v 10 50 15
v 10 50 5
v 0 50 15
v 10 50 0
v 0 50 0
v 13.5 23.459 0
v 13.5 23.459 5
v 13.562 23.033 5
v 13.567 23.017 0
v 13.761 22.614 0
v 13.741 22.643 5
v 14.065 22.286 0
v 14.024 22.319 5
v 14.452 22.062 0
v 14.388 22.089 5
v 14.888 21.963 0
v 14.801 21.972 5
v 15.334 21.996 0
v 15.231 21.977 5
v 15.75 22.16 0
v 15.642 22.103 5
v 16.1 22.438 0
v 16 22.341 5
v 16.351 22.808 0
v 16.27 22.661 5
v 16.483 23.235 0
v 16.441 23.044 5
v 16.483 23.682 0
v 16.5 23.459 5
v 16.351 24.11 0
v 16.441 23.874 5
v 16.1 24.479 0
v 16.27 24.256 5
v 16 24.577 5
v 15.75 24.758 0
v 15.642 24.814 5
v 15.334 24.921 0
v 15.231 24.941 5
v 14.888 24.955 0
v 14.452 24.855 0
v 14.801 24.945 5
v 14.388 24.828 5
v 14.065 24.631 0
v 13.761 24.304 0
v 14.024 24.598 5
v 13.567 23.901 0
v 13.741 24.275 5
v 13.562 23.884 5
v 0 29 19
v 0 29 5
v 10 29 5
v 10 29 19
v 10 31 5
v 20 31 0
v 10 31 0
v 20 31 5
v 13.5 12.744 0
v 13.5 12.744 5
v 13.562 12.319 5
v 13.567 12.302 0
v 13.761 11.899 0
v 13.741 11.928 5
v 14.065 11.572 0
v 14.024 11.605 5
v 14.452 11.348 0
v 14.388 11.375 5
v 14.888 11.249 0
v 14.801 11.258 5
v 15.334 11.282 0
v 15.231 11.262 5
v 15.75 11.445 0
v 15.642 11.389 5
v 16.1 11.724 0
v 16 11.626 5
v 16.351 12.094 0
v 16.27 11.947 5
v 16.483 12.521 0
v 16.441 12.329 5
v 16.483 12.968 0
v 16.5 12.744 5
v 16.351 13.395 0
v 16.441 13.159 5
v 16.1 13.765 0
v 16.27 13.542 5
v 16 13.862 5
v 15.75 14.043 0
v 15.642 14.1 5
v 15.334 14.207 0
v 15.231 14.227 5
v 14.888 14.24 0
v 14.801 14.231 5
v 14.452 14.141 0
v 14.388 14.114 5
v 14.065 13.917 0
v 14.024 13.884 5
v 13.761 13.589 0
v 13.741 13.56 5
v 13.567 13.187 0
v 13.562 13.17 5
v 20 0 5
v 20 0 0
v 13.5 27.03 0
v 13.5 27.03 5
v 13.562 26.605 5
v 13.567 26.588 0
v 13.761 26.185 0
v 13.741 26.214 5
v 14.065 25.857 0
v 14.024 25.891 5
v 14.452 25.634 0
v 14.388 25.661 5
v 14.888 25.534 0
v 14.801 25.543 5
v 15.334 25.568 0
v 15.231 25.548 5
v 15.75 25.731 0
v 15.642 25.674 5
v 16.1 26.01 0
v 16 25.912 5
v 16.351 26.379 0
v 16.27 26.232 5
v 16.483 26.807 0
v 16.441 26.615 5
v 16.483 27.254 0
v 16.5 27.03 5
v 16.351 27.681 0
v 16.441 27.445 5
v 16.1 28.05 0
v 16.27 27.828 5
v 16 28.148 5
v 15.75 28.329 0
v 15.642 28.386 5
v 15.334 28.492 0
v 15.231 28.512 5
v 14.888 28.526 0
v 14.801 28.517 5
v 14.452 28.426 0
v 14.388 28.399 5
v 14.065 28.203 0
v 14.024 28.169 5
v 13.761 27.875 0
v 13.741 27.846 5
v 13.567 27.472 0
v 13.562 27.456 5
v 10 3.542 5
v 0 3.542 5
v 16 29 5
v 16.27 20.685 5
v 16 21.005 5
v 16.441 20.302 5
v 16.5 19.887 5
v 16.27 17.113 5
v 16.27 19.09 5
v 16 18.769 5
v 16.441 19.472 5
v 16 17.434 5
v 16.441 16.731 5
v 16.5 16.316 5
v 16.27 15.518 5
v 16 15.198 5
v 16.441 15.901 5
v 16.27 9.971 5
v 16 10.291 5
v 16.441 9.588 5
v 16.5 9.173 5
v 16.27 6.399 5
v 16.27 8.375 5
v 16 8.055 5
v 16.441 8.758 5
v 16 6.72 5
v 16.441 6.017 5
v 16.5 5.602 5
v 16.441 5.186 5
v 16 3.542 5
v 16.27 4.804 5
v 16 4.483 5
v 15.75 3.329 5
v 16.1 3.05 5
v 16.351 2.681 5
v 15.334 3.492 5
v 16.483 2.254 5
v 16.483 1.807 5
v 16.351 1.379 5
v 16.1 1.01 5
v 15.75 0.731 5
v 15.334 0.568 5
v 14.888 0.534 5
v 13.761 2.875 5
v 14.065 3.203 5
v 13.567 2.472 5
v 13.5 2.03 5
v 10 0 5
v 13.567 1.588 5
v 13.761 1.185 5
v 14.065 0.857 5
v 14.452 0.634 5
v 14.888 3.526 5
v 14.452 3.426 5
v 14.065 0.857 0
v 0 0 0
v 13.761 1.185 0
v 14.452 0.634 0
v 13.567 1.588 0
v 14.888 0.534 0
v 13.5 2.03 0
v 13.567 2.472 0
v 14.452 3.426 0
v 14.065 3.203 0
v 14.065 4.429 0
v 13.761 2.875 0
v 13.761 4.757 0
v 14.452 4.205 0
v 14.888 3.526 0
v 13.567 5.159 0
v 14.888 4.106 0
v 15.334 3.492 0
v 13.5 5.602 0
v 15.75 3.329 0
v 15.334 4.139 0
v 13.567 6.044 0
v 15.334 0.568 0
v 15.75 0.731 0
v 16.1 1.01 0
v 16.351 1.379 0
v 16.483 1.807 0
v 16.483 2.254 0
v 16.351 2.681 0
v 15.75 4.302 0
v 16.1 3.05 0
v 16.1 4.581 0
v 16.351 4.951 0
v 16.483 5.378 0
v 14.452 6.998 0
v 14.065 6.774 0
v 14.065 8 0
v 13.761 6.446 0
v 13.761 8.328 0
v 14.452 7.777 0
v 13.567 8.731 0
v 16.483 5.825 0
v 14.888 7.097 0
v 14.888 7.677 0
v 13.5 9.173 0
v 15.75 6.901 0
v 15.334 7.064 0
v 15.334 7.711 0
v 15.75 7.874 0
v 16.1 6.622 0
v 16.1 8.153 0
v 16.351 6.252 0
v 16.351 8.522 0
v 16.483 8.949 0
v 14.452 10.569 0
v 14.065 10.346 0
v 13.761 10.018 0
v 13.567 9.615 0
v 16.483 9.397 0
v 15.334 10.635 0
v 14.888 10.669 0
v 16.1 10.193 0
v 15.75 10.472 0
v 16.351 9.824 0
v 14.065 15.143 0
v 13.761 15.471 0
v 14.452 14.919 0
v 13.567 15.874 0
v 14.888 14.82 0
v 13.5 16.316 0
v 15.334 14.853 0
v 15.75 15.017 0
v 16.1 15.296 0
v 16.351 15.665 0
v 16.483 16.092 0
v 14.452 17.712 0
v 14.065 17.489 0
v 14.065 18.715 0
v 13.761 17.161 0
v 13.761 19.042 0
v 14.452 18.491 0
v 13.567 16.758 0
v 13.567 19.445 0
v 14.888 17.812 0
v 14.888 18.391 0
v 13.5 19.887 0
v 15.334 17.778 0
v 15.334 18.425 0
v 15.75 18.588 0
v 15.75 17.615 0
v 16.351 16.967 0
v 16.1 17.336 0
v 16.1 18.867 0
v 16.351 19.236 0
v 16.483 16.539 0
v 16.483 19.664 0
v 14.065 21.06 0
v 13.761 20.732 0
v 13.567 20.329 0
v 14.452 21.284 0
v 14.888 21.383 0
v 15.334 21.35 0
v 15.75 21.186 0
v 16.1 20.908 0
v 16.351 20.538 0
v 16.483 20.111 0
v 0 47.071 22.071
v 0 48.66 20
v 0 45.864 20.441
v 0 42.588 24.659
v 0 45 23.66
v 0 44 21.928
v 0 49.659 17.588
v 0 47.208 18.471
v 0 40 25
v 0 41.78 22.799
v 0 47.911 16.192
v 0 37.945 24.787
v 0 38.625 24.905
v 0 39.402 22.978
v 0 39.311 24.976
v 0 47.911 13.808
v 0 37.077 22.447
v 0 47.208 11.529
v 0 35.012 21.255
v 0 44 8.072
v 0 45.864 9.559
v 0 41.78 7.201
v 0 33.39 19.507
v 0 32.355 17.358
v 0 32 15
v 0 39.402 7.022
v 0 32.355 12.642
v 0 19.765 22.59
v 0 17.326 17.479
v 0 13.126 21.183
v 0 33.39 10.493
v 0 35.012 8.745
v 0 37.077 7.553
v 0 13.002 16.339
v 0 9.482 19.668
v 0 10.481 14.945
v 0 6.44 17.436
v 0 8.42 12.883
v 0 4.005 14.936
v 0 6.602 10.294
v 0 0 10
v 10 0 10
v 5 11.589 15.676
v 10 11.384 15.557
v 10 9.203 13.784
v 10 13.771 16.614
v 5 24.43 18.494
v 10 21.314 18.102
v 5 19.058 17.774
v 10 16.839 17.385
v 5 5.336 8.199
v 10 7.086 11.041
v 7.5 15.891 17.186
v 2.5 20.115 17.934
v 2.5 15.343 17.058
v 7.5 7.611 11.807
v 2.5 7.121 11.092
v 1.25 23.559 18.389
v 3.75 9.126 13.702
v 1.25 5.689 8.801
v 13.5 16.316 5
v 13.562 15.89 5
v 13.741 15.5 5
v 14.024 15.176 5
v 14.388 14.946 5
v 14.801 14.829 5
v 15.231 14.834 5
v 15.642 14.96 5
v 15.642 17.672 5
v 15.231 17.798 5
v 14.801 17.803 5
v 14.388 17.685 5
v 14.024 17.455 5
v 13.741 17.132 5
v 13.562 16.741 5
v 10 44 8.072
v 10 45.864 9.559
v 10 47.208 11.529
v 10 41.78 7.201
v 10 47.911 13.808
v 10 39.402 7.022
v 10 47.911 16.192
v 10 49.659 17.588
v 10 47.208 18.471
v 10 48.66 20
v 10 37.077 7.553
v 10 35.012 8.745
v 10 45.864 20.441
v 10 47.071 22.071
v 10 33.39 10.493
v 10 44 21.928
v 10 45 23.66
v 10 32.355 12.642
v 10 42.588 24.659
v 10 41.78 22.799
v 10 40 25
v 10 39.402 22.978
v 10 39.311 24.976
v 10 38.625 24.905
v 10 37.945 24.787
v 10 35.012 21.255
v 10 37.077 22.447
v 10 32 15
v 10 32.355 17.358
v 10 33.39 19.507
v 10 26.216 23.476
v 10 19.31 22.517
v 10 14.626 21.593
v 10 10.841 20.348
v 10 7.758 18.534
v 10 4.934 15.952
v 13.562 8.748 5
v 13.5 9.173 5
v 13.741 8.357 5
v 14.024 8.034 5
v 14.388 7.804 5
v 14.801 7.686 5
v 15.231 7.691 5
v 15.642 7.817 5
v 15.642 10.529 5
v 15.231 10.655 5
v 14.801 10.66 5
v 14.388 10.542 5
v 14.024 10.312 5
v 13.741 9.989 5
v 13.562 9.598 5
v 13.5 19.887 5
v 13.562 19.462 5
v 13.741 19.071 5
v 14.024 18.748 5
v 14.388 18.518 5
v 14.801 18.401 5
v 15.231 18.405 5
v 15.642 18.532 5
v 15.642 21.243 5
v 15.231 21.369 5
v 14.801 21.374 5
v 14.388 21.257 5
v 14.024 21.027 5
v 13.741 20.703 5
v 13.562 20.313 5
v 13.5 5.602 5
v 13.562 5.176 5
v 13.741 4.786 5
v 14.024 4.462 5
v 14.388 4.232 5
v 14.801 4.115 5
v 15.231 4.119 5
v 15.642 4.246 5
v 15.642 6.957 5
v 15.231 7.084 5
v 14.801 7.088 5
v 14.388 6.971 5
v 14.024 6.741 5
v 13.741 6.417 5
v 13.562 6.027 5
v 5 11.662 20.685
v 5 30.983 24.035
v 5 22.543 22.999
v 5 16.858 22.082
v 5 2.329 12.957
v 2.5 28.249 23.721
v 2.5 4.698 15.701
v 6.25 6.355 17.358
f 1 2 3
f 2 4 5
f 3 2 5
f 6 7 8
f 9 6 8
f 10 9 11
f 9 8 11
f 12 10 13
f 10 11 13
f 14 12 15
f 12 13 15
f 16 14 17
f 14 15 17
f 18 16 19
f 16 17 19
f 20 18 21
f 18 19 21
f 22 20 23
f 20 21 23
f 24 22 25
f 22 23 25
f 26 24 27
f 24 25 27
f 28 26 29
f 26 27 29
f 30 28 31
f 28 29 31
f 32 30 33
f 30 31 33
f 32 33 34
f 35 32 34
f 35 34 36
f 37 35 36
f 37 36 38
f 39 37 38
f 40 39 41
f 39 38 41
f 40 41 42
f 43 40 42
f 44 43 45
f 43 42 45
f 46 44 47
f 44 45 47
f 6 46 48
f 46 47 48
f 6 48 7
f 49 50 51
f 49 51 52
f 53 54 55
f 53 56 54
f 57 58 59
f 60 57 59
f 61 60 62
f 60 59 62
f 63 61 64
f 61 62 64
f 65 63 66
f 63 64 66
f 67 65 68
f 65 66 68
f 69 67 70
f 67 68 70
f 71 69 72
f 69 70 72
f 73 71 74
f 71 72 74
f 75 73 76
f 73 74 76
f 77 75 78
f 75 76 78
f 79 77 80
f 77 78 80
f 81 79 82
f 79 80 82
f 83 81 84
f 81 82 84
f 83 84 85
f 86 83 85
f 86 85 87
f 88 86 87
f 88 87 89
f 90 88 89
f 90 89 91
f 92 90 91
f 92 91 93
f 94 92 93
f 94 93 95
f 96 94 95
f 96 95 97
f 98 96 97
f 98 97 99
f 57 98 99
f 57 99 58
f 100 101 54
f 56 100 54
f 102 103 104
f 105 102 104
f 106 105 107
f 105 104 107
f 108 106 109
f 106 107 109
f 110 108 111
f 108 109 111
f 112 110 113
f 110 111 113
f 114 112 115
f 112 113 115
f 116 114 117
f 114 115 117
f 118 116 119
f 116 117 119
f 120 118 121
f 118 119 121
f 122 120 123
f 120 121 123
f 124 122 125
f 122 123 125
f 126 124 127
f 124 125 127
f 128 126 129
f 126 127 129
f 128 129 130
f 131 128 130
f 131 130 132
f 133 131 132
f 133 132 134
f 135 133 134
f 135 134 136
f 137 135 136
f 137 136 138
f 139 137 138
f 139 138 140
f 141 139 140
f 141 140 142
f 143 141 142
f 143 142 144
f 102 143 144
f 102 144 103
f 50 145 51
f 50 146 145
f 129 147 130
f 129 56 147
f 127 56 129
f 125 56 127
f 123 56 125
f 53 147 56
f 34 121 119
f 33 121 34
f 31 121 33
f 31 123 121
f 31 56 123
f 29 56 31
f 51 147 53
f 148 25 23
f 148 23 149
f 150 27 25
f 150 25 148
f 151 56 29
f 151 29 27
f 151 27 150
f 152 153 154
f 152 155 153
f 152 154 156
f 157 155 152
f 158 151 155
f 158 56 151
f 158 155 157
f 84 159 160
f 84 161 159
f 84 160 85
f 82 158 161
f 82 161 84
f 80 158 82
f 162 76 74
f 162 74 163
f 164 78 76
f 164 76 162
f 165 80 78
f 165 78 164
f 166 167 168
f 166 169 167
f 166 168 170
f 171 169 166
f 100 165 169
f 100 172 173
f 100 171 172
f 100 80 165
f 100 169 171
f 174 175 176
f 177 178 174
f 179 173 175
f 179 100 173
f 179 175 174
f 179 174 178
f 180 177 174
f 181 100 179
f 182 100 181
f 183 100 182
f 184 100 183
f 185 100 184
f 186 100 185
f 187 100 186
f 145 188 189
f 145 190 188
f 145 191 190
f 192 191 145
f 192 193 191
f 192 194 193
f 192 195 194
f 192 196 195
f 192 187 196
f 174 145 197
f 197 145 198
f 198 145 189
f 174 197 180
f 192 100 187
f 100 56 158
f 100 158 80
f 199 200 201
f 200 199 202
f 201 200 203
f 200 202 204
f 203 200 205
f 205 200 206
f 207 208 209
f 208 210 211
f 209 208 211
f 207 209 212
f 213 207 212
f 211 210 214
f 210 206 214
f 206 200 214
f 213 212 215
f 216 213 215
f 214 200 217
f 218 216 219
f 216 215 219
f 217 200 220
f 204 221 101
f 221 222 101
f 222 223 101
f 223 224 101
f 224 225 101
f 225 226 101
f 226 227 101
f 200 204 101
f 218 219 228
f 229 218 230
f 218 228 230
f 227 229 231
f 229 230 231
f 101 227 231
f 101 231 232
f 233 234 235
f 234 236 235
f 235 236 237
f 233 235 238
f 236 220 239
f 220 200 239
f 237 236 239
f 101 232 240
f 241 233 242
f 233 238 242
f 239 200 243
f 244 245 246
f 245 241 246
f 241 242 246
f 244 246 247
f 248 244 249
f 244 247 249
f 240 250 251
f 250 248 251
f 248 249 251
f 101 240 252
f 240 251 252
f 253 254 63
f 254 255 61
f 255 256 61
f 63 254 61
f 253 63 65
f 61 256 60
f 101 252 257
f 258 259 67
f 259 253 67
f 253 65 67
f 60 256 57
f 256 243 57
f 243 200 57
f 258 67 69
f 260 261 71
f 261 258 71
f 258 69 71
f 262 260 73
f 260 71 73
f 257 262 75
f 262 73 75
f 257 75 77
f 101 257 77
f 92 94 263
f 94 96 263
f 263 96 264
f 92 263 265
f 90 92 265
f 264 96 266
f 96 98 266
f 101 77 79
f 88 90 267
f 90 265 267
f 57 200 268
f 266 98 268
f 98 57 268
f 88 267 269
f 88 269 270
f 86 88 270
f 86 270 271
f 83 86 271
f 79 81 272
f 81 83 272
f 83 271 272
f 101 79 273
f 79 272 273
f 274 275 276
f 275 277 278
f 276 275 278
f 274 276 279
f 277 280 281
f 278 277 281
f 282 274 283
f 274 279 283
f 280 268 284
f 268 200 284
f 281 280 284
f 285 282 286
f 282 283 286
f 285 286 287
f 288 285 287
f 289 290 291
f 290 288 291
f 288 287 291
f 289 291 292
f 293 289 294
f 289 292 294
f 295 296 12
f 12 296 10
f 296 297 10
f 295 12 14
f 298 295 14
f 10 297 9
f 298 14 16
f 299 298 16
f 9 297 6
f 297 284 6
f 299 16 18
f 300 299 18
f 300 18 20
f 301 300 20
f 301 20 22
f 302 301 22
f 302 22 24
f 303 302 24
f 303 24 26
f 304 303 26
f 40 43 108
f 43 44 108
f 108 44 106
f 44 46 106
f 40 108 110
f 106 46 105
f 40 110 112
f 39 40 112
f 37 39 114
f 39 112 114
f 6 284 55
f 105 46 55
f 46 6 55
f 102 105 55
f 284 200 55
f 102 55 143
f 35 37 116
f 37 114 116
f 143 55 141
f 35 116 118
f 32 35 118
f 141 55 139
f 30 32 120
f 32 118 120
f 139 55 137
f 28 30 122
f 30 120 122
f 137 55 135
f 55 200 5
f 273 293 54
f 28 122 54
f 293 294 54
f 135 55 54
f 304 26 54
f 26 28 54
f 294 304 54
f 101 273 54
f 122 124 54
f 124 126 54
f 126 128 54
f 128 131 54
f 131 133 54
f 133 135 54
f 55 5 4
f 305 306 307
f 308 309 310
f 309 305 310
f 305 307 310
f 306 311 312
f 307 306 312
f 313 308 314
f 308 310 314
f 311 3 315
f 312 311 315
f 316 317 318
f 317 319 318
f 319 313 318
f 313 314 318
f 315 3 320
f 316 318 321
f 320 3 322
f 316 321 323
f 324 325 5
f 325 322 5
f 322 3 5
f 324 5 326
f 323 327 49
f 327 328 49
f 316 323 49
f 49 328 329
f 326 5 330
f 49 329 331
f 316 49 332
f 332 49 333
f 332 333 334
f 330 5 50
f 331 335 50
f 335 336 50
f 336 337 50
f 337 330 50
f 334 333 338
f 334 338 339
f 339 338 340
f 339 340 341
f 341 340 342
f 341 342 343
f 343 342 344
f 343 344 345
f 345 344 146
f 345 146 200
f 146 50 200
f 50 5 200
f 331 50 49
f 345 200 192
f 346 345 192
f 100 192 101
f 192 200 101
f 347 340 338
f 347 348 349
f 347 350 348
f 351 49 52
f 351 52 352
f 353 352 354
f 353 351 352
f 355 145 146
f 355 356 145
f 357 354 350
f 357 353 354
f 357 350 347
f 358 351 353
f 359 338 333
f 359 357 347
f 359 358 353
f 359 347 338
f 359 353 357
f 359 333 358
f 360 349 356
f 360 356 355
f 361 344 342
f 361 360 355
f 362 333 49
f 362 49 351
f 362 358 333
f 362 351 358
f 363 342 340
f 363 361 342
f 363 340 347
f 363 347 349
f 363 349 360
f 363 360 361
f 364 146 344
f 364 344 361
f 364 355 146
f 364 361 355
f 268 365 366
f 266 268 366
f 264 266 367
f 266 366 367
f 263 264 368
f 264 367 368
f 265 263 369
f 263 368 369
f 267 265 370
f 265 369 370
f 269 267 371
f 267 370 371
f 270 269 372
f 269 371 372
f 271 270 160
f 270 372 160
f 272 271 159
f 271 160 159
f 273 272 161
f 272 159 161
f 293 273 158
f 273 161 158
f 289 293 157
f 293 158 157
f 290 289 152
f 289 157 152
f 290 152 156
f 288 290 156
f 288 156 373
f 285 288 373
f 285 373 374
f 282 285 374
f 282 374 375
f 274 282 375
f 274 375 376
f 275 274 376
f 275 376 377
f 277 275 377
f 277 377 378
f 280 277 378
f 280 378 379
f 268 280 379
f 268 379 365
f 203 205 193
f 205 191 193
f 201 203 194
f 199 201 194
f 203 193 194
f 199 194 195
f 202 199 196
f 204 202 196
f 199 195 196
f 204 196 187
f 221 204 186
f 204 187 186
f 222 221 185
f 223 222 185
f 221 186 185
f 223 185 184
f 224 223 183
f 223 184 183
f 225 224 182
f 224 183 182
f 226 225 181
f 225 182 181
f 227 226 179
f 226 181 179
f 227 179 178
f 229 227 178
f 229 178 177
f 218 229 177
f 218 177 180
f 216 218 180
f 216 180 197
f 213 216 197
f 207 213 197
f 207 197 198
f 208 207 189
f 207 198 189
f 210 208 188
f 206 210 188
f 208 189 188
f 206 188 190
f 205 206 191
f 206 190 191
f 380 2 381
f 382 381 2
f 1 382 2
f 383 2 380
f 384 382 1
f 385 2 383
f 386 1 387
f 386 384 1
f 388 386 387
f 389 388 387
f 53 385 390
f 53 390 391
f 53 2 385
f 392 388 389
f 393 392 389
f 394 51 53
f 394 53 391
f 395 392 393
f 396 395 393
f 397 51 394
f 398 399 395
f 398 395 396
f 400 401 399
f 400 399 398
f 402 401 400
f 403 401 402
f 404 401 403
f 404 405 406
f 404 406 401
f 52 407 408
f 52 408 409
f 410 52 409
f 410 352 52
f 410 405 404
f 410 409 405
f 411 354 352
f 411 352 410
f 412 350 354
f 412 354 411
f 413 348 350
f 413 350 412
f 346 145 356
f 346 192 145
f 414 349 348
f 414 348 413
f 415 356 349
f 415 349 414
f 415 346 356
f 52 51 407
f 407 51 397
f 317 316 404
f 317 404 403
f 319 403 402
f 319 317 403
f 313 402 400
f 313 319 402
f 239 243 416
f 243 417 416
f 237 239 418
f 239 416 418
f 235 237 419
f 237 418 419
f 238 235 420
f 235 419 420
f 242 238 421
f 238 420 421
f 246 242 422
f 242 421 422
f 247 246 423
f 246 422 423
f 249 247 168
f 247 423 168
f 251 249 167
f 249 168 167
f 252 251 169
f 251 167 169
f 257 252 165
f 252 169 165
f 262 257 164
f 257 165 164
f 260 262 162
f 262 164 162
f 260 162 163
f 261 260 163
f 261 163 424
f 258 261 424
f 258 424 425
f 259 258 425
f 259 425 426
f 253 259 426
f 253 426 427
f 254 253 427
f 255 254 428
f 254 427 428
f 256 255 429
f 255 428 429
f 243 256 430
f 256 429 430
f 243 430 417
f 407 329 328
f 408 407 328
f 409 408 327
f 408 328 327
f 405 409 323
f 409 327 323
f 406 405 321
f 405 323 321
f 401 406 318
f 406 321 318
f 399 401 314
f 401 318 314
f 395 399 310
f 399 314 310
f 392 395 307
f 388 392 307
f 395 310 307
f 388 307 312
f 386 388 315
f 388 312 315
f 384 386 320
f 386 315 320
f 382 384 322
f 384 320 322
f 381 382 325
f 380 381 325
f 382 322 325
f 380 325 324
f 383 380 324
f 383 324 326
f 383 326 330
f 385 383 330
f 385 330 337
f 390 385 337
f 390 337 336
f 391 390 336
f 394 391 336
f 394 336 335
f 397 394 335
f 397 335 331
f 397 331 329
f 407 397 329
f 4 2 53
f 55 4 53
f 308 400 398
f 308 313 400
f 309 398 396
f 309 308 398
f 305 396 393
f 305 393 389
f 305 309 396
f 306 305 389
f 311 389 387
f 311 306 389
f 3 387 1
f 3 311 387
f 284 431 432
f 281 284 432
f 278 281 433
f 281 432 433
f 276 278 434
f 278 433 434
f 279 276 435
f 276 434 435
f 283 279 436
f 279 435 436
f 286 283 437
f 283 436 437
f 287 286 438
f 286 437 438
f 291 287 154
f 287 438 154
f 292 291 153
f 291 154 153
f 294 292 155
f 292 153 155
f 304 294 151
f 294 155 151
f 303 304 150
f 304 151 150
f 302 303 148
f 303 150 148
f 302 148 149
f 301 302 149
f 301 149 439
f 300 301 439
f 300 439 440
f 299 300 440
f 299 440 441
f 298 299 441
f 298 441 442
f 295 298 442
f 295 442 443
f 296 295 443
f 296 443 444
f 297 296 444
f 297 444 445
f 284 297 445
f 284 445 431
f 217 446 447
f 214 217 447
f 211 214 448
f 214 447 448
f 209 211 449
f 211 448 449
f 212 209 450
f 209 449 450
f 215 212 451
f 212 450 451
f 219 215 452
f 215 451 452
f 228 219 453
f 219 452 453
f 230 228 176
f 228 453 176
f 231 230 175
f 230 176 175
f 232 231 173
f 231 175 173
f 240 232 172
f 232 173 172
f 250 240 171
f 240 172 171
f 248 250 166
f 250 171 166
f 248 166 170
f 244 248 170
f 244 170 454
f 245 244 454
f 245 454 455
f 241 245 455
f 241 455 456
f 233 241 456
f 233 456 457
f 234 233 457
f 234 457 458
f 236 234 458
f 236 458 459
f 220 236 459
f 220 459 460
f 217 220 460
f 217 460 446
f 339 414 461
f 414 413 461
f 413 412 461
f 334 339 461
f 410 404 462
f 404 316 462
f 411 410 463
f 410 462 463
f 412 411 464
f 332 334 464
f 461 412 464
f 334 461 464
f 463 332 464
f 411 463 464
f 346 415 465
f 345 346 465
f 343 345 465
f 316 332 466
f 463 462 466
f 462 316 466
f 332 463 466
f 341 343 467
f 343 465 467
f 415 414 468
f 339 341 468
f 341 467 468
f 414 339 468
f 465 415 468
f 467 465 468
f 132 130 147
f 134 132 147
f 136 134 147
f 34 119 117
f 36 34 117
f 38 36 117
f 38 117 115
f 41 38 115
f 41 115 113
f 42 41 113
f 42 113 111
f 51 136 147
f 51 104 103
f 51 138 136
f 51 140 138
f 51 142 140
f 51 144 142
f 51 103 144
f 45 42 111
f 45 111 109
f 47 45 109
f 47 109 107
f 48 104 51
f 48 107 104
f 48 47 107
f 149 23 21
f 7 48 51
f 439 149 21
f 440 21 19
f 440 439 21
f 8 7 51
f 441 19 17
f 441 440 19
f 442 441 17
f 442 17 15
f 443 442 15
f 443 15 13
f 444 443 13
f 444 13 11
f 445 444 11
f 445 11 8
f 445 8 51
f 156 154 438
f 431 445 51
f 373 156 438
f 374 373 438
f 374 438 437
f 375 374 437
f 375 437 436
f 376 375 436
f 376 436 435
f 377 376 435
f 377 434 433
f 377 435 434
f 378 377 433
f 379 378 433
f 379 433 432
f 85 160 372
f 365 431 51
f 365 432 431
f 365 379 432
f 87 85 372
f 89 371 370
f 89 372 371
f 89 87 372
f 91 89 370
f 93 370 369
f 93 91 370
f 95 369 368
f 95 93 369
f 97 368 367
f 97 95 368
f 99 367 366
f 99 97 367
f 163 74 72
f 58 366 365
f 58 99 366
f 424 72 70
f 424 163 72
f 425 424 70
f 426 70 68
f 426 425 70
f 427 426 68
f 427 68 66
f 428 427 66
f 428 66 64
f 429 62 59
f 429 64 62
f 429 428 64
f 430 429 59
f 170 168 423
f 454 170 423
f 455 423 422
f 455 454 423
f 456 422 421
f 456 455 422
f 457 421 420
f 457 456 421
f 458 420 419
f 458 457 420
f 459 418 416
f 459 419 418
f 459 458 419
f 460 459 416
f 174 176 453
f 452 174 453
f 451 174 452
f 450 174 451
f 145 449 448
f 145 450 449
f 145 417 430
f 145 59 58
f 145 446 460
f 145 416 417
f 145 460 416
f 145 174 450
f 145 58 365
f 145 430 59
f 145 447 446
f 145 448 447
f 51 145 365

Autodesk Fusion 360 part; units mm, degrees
sketch "Sketch1" plane through (0, 0, 0) normal (0, 0, 1) x (1, 0, 0)
  line L0 (0, 0) -> (20, 0)
  line L1 (20, 0) -> (20, 50)
  line L2 (20, 50) -> (0, 50)
  line L3 (0, 50) -> (0, 0)
  dimension "d1" = 50
extrude "Extrude1" add sketch "Sketch1" along normal blind 30
sketch "Sketch2" plane through (0, 0, 0) normal (0, -1, 0) x (1, 0, 0)
  line L0 (0, 0) -> (20, 0)
  line L1 (20, 0) -> (20, 30)
  line L2 (20, 30) -> (0, 30)
  line L3 (0, 30) -> (0, 0)
  line L4 (0, 30) -> (10, 30)
  line L5 (20, 0) -> (20, 5)
  line L6 (20, 5) -> (10, 5)
  line L7 (10, 5) -> (10, 30)
  dimension "d4" = 5
extrude "Extrude2" cut sketch "Sketch2" against normal blind 70 contours L1 L2 L6 L7
sketch "Sketch3" plane through (0, 0, 0) normal (-1, 0, 0) x (0, -1, 0)
  line L0 (-50, 0) -> (0, 0)
  line L1 (0, 0) -> (0, 30)
  line L2 (0, 30) -> (-50, 30)
  line L3 (-50, 30) -> (-50, 0)
  line L4 (-50, 15) -> (-40, 15)
  line L5 (-40, 15) -> (-40, 30)
  circle A0 centre (-40, 15) radius 8
  dimension "d7" = 16
extrude "Extrude3" cut sketch "Sketch3" against normal blind 15 contours L4 L5 A0 | L4 L5 A0
sketch "Sketch4" plane through (0, 0, 5) normal (0, 0, 1) x (-1, 0, 0)
  line L0 (-20, -50) -> (-10, -50)
  line L1 (-10, -50) -> (-10, 0)
  line L2 (-10, 0) -> (-20, 0)
  line L3 (-20, 0) -> (-20, -50)
  circle A0 centre (-15, -45) radius 0.25
  line L4 (-10, -30) -> (-20, -30)
  circle A1 centre (-15, -27.0301) radius 1.5
  circle A2 centre (-15, -23.4587) radius 1.5
  circle A3 centre (-15, -19.8873) radius 1.5
  circle A4 centre (-15, -16.3158) radius 1.5
  circle A5 centre (-15, -12.7444) radius 1.5
  circle A6 centre (-15, -9.173) radius 1.5
  circle A7 centre (-15, -5.6015) radius 1.5
  circle A8 centre (-15, -2.0301) radius 1.5
  dimension "d11" = 3
  dimension "d14" = 0
  dimension "d15" = 25
extrude "Extrude4" cut sketch "Sketch4" against normal blind 15 contours A1 | A2 | A3 | A4 | A5 | A6 | A7 | A8
sketch "Sketch5" plane through (0, 0, 0) normal (-1, 0, 0) x (0, -1, 0)
  circle A0 centre (-40, 15) radius 8
  line L0 (-50, 0) -> (0, 0)
  line L1 (0, 0) -> (0, 30)
  line L2 (0, 30) -> (-50, 30)
  line L3 (-50, 30) -> (-50, 0)
  circle A1 centre (-40, 15) radius 10
  spline S0 degree 2 poles (-40, 25) (-9.0379, 21.8056) (0, 10) knots 0 0 0 4.447549 4.447549 4.447549 weights 1 3 1
extrude "Extrude5" cut sketch "Sketch5" against normal blind 60 contours L1 L2 L3 A1 S0
sketch "Sketch6" plane through (0, 0, 0) normal (-1, 0, 0) x (0, -1, 0)
  arc A0 (-37.945, 24.7866) -> (-50, 15) centre (-40, 15) ccw
  line L0 (-50, 15) -> (-50, 0)
  line L1 (-50, 0) -> (0, 0)
  line L2 (0, 0) -> (0, 10)
  spline S0 degree 2 poles (0, 10) (-9.0024, 21.7593) (-37.945, 24.7866) knots -4.447549 -4.447549 -4.447549 -0.051947 -0.051947 -0.051947 weights 1 2.97664 1.046174
  circle A1 centre (-40, 15) radius 8
  line L3 (-3, 4) -> (-4, 4)
  line L4 (-4, 4) -> (-29, 4)
  line L5 (-29, 4) -> (-29, 19)
  spline S1 degree 2 poles (-29, 19) (-10, 17) (-3, 4) knots 0 0 0 3.222354 3.222354 3.222354 weights 1 3 1
  line L6 (-3.5416, 5) -> (-29, 5)
extrude "Extrude6" cut sketch "Sketch6" against normal blind 16 contours L5 S1 L6
sketch "Sketch7" plane through (0, 0, 5) normal (0, 0, 1) x (-1, 0, 0)
  circle A0 centre (-15, -9.173) radius 1.5
  circle A1 centre (-15, -5.6015) radius 1.5
  circle A2 centre (-15, -12.7444) radius 1.5
  circle A3 centre (-15, -16.3158) radius 1.5
  line L0 (-10, -3.5416) -> (-10, 0)
  line L1 (-10, 0) -> (-20, 0)
  line L2 (-20, 0) -> (-20, -50)
  line L3 (-20, -50) -> (-10, -50)
  line L4 (-10, -50) -> (-10, -29)
  line L5 (-10, -29) -> (0, -29)
  line L6 (0, -29) -> (0, -3.5416)
  line L7 (0, -3.5416) -> (-10, -3.5416)
  circle A4 centre (-15, -19.8873) radius 1.5
  circle A5 centre (-15, -27.0301) radius 1.5
  circle A6 centre (-15, -23.4587) radius 1.5
  circle A7 centre (-15, -2.0301) radius 1.5
  line L8 (-10, -50) -> (-10, -31)
  line L9 (-20, -31) -> (-10, -31)
  line L10 (-20, -31) -> (-20, -50)
  line L11 (-10, -50) -> (-20, -50)
extrude "Extrude7" cut sketch "Sketch7" against normal blind 15 contours L2 L3 L4 L8 L9 L10 L11
